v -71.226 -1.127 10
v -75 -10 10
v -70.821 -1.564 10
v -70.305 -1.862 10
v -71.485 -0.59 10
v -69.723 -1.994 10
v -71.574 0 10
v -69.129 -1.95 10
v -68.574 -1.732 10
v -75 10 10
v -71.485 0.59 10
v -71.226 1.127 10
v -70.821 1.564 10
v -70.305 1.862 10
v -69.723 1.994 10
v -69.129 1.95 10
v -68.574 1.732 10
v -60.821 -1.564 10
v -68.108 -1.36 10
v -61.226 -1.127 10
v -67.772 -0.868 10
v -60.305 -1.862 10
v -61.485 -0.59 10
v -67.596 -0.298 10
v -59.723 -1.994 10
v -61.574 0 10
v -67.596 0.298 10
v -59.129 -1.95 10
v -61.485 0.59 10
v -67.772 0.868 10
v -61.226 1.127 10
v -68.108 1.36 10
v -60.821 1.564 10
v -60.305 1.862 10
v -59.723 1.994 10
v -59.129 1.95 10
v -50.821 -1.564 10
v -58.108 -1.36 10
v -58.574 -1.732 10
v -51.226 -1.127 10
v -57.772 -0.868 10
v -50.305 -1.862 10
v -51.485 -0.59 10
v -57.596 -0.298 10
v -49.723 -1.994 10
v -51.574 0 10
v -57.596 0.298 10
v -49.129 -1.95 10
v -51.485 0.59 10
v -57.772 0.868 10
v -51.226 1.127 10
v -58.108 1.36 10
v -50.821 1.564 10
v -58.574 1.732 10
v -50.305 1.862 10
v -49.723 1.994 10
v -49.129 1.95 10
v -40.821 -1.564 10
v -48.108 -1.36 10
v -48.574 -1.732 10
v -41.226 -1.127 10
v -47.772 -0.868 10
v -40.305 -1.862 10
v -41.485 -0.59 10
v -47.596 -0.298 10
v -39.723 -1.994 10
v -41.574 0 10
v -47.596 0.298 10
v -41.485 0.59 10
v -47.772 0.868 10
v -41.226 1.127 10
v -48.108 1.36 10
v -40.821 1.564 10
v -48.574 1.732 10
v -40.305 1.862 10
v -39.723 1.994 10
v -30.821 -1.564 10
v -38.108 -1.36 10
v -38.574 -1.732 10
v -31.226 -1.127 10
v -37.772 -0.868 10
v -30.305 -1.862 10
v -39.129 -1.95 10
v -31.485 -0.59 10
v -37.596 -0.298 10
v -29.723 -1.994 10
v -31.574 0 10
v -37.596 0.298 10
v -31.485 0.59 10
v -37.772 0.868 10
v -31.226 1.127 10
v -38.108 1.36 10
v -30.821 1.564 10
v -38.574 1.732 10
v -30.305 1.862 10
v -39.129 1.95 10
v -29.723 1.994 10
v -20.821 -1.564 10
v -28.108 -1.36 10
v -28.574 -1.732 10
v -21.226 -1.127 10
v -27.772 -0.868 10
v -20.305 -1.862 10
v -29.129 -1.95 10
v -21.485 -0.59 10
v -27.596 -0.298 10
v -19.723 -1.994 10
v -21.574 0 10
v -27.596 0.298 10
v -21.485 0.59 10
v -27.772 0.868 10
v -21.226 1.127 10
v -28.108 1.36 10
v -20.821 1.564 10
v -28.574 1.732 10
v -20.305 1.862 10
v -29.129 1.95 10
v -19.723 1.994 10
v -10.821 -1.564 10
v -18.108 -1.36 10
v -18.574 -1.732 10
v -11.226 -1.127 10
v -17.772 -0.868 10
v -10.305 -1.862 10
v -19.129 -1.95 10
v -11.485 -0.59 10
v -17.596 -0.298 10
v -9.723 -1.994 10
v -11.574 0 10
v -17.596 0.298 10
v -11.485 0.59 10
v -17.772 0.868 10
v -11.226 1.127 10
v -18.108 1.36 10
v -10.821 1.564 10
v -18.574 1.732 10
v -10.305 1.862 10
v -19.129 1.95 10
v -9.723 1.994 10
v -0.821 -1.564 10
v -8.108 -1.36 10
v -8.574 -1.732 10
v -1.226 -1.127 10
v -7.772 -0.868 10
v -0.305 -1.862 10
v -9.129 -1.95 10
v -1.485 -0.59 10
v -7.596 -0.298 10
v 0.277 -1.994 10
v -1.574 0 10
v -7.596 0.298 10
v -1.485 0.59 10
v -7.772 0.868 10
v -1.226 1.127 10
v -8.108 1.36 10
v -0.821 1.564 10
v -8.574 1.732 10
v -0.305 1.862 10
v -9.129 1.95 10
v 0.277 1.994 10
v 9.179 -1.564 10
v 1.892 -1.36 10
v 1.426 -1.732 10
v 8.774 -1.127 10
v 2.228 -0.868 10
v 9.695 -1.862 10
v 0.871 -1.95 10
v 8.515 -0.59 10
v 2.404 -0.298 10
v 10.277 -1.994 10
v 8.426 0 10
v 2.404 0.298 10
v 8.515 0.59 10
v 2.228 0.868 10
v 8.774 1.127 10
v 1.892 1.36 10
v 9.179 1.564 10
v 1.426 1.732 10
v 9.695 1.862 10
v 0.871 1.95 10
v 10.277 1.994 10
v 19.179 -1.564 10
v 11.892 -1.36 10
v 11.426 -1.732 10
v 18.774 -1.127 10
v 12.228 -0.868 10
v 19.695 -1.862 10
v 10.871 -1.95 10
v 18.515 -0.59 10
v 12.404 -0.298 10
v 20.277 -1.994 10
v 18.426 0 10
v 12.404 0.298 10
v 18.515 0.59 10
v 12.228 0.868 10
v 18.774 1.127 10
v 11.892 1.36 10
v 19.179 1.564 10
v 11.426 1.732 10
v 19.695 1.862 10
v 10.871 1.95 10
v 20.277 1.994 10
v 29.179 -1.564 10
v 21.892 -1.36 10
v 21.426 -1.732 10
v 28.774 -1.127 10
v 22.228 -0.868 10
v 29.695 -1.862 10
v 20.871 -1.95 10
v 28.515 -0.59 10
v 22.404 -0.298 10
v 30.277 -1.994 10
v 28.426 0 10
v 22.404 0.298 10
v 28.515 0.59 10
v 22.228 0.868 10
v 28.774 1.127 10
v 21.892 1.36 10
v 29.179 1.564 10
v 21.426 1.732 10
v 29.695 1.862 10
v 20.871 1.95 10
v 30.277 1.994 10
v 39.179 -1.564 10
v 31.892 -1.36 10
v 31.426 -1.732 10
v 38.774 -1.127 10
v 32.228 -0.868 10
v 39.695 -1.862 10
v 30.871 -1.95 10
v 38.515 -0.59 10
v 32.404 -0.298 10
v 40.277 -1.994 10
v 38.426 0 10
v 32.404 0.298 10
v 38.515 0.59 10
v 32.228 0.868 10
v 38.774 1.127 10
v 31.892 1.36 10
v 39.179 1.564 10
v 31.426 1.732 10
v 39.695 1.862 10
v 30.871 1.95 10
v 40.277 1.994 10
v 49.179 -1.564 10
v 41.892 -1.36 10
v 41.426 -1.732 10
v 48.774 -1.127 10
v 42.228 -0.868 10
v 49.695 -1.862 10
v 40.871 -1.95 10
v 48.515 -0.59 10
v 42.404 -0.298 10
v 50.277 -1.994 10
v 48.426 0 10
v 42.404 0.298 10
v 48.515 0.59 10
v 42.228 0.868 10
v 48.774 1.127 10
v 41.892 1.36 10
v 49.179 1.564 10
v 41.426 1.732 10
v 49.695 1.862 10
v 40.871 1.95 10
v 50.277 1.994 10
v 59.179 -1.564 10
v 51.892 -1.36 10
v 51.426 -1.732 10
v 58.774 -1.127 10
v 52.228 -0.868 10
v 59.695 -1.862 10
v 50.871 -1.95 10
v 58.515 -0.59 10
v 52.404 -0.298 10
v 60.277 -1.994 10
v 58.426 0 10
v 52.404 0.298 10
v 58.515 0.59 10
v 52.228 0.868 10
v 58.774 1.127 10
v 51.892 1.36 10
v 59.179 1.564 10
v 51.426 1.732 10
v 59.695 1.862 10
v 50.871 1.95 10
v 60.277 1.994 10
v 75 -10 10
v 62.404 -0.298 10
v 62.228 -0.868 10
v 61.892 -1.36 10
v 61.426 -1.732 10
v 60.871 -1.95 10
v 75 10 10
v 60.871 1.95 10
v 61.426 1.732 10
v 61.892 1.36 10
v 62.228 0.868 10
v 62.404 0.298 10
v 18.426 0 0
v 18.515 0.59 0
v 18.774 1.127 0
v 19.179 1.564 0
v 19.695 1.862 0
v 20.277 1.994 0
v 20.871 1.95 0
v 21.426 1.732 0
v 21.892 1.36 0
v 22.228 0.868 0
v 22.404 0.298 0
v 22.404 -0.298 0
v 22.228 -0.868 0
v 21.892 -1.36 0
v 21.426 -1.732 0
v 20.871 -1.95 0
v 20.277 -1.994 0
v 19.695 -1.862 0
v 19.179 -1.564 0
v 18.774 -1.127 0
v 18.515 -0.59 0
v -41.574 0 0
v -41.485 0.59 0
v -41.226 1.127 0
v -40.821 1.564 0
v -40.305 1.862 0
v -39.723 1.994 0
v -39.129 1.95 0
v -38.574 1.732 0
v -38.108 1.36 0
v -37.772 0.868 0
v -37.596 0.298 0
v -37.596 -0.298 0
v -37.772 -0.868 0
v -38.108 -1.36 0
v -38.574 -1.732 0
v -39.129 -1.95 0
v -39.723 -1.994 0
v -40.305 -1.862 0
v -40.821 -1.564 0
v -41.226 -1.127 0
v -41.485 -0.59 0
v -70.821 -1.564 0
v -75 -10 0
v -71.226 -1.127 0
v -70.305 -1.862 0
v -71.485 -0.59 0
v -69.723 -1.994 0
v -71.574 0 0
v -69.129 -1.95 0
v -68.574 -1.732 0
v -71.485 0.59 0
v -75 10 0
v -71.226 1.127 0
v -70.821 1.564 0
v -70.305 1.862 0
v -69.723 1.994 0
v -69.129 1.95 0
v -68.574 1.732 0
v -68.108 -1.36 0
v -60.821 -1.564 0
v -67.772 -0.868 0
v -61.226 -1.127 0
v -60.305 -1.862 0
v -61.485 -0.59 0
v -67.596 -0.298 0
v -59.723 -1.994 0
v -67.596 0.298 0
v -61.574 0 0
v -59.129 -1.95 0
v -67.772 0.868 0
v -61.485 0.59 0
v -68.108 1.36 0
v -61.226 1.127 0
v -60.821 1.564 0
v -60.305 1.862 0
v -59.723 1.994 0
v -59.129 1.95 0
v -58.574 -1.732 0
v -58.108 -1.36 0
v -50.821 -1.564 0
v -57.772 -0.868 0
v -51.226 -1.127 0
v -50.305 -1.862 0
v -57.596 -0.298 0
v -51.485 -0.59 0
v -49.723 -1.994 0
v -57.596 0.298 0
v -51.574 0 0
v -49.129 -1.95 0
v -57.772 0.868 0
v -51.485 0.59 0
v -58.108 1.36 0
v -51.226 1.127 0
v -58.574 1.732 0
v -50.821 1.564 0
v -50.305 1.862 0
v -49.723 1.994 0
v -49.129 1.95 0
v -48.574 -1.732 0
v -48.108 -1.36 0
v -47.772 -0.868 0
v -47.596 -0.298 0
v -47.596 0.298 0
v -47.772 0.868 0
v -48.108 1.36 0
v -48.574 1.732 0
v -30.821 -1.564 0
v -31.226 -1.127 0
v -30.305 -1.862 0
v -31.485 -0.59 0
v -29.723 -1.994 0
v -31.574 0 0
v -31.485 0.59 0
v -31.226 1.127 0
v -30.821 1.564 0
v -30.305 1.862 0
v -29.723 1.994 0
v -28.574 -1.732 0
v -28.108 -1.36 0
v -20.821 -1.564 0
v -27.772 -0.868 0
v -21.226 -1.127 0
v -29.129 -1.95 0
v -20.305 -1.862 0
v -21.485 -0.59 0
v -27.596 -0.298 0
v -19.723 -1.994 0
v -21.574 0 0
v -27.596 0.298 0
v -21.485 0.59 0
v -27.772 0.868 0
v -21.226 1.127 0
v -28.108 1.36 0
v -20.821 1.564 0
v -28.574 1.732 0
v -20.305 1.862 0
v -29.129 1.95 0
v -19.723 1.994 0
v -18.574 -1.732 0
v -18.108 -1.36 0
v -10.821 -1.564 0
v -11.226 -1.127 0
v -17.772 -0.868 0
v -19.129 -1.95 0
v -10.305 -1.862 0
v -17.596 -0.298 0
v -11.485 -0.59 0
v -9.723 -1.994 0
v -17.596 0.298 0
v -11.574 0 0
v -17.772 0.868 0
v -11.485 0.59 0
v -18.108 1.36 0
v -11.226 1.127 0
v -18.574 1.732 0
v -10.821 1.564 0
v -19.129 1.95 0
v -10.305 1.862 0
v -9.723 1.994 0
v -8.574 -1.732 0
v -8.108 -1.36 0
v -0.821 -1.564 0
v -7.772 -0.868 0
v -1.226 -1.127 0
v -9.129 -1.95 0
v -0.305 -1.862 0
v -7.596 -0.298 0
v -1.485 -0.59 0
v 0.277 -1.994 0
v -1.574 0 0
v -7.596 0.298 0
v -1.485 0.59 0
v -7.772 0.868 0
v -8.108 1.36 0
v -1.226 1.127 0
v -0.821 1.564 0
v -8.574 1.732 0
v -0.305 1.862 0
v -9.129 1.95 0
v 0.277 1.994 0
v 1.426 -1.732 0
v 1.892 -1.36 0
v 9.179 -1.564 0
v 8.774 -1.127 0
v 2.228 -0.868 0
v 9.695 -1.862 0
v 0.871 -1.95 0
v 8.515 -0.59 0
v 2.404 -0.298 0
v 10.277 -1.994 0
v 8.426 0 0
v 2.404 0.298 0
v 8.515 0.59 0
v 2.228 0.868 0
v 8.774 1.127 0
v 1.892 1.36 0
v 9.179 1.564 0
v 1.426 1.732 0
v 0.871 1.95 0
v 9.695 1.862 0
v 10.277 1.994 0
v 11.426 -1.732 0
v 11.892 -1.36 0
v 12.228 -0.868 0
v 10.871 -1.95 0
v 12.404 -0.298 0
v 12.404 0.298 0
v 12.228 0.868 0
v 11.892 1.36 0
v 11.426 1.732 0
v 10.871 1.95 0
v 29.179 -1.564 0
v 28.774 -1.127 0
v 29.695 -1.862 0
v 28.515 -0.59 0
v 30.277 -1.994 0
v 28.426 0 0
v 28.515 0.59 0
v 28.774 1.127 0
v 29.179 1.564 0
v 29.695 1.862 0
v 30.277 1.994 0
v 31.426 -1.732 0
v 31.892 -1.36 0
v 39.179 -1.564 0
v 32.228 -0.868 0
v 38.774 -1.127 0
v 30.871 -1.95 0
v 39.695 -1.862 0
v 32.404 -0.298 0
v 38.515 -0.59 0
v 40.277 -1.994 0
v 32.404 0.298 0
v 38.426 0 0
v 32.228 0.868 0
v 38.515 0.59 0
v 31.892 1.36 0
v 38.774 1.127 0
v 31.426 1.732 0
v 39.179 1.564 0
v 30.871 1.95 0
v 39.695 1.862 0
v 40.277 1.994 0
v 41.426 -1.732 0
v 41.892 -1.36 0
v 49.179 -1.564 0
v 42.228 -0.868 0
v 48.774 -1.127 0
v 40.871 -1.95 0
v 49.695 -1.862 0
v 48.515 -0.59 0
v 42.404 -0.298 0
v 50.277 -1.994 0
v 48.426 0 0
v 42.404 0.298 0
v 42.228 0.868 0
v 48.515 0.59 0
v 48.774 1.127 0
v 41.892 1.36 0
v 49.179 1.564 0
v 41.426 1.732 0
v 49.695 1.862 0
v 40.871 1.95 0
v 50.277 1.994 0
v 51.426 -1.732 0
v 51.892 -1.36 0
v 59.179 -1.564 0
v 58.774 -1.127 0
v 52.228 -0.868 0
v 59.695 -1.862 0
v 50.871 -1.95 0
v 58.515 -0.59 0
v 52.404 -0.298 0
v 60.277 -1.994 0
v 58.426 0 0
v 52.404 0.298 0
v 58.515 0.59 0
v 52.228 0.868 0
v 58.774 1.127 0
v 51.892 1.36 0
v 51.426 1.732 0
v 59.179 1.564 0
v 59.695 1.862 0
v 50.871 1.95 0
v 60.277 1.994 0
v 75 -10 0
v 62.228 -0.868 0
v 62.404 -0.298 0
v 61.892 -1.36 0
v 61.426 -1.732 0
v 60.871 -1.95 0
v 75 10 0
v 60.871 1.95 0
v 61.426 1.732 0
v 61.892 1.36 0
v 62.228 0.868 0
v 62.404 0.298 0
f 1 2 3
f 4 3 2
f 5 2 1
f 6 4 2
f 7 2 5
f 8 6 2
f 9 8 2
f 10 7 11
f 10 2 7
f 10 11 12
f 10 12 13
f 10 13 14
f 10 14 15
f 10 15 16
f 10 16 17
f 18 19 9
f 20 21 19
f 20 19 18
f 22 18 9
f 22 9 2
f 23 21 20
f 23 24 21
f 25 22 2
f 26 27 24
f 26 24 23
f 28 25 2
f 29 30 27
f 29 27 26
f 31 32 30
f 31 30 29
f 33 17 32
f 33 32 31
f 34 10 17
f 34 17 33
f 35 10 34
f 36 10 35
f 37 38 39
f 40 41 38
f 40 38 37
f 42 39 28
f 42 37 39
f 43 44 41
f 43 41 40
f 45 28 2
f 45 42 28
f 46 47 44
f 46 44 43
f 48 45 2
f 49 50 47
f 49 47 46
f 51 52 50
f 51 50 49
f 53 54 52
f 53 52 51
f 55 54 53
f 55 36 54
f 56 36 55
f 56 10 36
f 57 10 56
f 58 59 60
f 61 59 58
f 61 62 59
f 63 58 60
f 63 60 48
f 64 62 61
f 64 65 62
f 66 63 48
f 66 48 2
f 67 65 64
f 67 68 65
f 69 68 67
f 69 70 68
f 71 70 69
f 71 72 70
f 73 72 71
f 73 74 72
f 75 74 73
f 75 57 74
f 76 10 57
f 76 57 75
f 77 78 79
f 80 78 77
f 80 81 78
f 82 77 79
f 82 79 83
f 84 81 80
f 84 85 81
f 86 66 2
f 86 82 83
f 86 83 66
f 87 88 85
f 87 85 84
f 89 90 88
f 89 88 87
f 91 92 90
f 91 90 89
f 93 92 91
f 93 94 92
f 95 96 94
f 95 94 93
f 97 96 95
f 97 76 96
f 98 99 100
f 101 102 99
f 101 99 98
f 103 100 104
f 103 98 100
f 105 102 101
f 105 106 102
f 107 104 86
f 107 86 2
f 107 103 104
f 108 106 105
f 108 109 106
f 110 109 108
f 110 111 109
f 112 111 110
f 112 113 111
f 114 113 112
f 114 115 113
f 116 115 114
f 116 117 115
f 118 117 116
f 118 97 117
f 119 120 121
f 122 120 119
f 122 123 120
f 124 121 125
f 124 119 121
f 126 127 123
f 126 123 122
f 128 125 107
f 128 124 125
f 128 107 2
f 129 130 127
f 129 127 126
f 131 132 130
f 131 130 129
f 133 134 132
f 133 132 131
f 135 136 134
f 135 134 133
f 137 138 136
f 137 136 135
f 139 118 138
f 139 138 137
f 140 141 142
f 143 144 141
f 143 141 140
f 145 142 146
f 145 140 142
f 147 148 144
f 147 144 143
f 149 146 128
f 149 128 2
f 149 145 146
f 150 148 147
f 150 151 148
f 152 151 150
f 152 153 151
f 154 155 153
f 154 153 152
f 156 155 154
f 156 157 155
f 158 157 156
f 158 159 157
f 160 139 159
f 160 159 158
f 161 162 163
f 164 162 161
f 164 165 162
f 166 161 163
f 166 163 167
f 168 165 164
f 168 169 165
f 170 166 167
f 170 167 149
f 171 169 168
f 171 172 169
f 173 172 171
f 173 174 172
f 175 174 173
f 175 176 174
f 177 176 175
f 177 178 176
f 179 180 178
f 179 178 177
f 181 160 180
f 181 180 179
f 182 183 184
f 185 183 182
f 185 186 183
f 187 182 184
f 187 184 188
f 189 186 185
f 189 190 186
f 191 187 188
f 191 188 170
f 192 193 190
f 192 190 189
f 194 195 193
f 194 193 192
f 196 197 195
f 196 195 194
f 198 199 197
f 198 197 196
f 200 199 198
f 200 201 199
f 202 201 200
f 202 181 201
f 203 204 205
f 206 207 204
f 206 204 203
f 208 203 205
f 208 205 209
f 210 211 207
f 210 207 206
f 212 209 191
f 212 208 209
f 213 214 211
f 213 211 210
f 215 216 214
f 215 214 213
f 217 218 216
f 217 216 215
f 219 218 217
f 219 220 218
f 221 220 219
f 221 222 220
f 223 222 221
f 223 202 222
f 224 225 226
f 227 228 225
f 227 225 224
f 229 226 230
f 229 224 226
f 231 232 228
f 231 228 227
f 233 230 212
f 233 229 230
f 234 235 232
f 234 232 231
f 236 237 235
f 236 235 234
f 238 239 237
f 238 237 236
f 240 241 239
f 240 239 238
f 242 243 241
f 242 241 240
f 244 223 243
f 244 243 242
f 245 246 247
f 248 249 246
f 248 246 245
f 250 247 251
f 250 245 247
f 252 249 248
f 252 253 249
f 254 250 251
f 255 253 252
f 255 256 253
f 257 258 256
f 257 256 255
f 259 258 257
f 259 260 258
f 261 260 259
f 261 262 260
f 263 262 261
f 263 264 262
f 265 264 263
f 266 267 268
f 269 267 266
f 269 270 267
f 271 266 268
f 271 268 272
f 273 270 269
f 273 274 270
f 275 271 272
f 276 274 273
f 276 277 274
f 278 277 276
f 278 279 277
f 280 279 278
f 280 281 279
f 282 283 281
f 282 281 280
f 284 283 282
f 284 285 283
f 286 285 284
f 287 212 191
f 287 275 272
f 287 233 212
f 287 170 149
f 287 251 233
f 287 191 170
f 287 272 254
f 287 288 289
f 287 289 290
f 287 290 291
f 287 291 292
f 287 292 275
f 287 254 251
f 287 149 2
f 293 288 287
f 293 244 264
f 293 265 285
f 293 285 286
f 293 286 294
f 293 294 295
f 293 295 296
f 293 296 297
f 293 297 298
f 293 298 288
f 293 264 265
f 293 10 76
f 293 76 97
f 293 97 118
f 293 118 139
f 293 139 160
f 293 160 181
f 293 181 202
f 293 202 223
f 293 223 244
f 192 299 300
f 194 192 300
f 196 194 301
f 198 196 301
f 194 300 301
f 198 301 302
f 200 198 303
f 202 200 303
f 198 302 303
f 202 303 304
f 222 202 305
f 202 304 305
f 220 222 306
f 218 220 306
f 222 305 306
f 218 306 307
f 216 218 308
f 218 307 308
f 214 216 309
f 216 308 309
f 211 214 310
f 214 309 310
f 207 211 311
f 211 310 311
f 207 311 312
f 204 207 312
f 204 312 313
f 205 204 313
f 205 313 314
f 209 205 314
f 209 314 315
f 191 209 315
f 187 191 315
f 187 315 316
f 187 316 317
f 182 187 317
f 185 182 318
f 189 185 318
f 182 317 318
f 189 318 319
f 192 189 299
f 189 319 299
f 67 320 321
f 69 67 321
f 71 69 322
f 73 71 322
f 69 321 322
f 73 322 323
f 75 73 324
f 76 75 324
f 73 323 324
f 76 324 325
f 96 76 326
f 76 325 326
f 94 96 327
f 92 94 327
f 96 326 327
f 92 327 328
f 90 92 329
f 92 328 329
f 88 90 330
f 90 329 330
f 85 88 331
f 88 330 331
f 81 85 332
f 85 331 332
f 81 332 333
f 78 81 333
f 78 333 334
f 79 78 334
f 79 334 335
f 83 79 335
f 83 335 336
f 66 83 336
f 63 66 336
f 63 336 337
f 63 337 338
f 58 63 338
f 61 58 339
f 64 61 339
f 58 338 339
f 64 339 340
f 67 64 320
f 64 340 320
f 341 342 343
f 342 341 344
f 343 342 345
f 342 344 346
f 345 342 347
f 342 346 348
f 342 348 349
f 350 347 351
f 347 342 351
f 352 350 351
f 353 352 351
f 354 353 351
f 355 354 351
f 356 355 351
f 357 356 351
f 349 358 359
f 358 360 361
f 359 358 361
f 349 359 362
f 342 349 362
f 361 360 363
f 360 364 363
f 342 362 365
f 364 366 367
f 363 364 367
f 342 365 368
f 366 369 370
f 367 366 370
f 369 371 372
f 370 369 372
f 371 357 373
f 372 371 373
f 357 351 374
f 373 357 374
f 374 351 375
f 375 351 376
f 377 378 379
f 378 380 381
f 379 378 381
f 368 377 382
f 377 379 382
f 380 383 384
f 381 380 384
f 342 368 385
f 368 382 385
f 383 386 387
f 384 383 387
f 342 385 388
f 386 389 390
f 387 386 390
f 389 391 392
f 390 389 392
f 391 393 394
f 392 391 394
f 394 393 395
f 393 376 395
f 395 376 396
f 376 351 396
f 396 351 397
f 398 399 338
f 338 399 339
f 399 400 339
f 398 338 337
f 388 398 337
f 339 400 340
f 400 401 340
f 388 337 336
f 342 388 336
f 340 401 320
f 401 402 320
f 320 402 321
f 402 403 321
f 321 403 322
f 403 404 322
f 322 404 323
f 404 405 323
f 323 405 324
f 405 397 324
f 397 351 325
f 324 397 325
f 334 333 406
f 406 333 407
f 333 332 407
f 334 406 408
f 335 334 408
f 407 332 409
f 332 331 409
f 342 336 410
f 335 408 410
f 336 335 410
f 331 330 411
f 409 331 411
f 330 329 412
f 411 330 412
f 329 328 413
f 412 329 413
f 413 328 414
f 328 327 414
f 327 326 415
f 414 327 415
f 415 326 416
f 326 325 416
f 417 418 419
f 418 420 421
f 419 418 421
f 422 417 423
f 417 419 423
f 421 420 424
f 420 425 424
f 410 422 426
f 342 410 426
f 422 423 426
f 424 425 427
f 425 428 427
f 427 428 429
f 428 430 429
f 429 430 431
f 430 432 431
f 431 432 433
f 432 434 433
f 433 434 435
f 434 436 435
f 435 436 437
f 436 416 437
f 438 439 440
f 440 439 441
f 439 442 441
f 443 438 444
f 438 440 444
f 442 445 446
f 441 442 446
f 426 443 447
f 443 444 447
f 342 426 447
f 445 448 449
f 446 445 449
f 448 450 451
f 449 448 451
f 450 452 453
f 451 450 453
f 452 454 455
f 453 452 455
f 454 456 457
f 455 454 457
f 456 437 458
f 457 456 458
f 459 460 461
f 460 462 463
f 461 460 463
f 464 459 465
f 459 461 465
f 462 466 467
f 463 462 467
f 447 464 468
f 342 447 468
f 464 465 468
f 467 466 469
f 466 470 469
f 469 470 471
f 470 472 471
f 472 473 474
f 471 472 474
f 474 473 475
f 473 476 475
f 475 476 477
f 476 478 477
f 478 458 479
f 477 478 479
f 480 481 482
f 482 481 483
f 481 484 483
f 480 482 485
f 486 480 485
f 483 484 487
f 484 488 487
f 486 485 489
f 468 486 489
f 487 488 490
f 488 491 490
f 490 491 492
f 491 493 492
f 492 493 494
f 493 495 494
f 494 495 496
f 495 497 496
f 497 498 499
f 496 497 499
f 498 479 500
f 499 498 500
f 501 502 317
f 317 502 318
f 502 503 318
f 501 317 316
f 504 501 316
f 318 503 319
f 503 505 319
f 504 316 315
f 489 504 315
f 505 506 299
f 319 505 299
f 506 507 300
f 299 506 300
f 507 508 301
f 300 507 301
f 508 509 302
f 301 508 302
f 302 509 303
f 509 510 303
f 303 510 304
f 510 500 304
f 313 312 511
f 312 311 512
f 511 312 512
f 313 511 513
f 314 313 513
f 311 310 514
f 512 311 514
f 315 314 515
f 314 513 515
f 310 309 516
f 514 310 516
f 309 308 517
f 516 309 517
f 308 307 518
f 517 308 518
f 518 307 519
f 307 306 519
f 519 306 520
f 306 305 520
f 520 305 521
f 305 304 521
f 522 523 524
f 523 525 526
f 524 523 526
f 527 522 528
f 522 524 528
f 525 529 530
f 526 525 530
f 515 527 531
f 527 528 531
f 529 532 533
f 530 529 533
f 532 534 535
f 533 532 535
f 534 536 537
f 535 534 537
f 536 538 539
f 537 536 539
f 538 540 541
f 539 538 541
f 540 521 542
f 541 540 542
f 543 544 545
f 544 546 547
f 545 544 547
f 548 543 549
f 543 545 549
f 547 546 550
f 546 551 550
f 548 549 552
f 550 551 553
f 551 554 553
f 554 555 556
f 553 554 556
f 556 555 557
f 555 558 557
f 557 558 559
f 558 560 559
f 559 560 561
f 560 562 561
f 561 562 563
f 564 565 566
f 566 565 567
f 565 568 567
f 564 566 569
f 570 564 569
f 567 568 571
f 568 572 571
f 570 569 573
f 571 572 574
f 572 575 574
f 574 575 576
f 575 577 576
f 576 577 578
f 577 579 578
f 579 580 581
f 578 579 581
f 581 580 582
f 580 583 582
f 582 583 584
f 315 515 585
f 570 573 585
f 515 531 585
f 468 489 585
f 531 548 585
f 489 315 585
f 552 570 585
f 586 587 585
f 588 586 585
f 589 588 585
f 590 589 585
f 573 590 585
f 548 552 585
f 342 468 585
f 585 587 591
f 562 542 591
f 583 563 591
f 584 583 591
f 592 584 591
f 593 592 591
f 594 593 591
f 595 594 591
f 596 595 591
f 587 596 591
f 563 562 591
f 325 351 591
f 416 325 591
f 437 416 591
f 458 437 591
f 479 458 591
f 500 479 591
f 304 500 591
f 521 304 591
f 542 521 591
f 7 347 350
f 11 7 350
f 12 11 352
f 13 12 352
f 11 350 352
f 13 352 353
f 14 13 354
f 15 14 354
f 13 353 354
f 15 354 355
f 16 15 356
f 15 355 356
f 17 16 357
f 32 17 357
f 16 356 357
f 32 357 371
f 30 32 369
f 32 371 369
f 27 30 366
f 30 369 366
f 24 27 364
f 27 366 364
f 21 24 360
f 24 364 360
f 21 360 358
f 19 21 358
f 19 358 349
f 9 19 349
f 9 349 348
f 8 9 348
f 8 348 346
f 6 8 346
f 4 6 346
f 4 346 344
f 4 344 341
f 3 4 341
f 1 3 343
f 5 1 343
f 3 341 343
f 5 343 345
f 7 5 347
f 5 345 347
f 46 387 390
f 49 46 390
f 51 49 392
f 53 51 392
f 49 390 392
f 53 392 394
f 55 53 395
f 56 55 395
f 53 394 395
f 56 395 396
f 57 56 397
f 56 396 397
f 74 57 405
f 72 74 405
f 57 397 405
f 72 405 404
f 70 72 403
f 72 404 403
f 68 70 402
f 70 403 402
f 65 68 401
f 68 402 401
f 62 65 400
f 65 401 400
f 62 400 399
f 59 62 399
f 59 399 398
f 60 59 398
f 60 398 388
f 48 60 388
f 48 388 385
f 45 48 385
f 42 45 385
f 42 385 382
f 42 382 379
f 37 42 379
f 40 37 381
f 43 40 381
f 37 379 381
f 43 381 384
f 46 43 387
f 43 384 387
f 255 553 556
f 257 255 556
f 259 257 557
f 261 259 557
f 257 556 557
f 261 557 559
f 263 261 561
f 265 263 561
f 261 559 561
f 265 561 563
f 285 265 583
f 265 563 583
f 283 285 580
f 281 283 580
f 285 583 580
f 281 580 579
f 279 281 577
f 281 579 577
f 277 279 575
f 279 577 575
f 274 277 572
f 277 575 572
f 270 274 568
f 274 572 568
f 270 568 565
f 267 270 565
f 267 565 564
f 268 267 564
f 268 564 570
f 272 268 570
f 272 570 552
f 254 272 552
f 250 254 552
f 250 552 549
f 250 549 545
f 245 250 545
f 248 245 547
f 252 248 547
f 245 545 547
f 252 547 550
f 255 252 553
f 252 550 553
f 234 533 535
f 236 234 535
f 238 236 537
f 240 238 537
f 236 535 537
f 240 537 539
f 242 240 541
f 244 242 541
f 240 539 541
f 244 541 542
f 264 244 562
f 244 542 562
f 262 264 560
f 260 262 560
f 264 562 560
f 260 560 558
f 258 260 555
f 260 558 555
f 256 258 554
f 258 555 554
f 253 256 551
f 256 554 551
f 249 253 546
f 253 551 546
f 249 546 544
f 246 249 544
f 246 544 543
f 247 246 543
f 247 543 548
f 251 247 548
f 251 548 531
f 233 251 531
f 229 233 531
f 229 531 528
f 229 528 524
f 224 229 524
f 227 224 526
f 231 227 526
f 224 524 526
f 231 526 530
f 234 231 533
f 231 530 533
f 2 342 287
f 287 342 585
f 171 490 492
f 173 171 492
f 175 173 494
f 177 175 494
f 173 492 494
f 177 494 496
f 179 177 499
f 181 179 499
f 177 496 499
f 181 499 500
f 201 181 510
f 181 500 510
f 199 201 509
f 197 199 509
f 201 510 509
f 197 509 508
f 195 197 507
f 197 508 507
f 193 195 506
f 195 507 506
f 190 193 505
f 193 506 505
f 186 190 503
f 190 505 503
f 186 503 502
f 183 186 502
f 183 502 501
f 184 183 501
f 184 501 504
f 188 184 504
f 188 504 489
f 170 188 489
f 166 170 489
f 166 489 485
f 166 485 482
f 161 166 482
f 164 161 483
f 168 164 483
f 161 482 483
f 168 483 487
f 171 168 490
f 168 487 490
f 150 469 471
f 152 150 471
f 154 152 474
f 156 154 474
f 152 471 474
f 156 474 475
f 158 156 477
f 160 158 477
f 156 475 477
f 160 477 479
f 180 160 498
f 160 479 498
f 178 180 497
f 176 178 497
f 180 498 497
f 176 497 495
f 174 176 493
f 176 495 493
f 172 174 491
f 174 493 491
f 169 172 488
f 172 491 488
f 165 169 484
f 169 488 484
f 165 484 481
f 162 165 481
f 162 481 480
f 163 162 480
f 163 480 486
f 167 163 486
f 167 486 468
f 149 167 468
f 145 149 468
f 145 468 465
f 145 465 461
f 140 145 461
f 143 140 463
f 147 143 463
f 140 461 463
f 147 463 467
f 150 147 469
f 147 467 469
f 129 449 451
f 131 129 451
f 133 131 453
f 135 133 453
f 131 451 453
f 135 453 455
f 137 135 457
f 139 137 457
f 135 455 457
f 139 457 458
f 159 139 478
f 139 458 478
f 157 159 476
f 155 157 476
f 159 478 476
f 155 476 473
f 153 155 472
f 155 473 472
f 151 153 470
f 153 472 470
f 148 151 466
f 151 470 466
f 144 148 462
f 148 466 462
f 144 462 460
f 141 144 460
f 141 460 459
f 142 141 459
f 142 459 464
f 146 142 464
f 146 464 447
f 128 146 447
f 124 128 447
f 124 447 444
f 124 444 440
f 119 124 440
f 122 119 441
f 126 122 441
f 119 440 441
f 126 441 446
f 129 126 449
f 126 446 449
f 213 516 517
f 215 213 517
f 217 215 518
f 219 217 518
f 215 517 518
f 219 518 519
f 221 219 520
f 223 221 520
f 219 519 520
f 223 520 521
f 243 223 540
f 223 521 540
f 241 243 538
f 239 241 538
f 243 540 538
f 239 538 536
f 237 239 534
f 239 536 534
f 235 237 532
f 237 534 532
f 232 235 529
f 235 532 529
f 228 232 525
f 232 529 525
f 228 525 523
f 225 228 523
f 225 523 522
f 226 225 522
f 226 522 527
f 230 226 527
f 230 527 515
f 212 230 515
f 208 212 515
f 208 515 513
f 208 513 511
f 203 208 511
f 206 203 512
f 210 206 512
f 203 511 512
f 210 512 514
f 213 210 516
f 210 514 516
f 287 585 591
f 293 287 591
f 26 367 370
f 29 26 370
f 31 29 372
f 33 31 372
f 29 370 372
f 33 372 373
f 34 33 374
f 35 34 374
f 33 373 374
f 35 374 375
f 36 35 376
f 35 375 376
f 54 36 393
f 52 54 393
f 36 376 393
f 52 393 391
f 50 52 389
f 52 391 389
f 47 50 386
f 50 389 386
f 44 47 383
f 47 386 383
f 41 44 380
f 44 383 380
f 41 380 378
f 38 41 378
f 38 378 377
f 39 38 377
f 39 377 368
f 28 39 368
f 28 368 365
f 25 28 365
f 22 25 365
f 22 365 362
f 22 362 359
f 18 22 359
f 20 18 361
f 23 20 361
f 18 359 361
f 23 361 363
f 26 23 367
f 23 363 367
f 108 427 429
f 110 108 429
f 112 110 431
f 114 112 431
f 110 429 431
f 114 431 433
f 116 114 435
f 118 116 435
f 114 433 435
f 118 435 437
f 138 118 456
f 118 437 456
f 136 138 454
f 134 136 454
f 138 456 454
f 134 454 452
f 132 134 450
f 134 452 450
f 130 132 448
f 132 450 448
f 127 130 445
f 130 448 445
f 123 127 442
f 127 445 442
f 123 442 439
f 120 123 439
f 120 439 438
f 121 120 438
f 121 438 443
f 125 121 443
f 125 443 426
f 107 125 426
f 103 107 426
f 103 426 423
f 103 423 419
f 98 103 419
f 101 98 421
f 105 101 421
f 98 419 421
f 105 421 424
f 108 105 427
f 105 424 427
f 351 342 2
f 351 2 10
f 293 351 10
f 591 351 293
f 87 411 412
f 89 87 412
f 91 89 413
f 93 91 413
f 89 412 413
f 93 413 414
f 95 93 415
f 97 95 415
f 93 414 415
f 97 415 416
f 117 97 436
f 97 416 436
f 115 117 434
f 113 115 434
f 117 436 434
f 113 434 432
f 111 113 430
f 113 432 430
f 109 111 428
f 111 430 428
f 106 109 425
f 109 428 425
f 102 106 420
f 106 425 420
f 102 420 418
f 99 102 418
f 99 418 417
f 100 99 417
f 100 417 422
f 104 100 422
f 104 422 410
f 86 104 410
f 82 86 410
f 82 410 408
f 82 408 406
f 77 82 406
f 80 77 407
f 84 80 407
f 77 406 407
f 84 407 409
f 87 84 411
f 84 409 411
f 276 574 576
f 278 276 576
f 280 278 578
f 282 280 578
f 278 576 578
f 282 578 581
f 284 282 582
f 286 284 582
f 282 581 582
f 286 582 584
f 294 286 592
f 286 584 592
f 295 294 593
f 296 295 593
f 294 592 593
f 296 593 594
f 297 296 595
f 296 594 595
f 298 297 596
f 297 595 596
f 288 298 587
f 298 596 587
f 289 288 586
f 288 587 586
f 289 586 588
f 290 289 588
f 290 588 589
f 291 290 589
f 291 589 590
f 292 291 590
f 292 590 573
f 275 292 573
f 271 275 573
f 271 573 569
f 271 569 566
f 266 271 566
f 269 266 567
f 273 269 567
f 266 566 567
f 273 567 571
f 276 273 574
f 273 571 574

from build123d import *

# Parameters (mm, degrees)
SKETCH_1_W          = 150
SKETCH_1_H          = 20
EXTRUDE_1_DEPTH     = 10
SKETCH_2_R          = 2
CUT_EXTRUDE_1_DEPTH = 10


with BuildPart() as part:
    # 草图1 → 凸台-拉伸1 (new body)
    with BuildSketch(Plane.XY):
        Rectangle(SKETCH_1_W, SKETCH_1_H)
    extrude(amount=EXTRUDE_1_DEPTH)

    # 草图2 → 切除-拉伸1 (cut)
    with BuildSketch(Plane(origin=(0, 0, 0), x_dir=(-1, 0, 0), z_dir=(0, 0, -1))):
        with Locations((69.573976668, 0)):
            Circle(SKETCH_2_R)
        with Locations((59.573976668, 0)):
            Circle(SKETCH_2_R)
        with Locations((49.573976668, 0)):
            Circle(SKETCH_2_R)
        with Locations((39.573976668, 0)):
            Circle(SKETCH_2_R)
        with Locations((29.573976668, 0)):
            Circle(SKETCH_2_R)
        with Locations((19.573976668, 0)):
            Circle(SKETCH_2_R)
        with Locations((9.573976668, 0)):
            Circle(SKETCH_2_R)
        with Locations((-0.426023332, 0)):
            Circle(SKETCH_2_R)
        with Locations((-10.426023332, 0)):
            Circle(SKETCH_2_R)
        with Locations((-20.426023332, 0)):
            Circle(SKETCH_2_R)
        with Locations((-30.426023332, 0)):
            Circle(SKETCH_2_R)
        with Locations((-40.426023332, 0)):
            Circle(SKETCH_2_R)
        with Locations((-50.426023332, 0)):
            Circle(SKETCH_2_R)
        with Locations((-60.426023332, 0)):
            Circle(SKETCH_2_R)
    extrude(amount=-CUT_EXTRUDE_1_DEPTH, mode=Mode.SUBTRACT)


solid = part.part
